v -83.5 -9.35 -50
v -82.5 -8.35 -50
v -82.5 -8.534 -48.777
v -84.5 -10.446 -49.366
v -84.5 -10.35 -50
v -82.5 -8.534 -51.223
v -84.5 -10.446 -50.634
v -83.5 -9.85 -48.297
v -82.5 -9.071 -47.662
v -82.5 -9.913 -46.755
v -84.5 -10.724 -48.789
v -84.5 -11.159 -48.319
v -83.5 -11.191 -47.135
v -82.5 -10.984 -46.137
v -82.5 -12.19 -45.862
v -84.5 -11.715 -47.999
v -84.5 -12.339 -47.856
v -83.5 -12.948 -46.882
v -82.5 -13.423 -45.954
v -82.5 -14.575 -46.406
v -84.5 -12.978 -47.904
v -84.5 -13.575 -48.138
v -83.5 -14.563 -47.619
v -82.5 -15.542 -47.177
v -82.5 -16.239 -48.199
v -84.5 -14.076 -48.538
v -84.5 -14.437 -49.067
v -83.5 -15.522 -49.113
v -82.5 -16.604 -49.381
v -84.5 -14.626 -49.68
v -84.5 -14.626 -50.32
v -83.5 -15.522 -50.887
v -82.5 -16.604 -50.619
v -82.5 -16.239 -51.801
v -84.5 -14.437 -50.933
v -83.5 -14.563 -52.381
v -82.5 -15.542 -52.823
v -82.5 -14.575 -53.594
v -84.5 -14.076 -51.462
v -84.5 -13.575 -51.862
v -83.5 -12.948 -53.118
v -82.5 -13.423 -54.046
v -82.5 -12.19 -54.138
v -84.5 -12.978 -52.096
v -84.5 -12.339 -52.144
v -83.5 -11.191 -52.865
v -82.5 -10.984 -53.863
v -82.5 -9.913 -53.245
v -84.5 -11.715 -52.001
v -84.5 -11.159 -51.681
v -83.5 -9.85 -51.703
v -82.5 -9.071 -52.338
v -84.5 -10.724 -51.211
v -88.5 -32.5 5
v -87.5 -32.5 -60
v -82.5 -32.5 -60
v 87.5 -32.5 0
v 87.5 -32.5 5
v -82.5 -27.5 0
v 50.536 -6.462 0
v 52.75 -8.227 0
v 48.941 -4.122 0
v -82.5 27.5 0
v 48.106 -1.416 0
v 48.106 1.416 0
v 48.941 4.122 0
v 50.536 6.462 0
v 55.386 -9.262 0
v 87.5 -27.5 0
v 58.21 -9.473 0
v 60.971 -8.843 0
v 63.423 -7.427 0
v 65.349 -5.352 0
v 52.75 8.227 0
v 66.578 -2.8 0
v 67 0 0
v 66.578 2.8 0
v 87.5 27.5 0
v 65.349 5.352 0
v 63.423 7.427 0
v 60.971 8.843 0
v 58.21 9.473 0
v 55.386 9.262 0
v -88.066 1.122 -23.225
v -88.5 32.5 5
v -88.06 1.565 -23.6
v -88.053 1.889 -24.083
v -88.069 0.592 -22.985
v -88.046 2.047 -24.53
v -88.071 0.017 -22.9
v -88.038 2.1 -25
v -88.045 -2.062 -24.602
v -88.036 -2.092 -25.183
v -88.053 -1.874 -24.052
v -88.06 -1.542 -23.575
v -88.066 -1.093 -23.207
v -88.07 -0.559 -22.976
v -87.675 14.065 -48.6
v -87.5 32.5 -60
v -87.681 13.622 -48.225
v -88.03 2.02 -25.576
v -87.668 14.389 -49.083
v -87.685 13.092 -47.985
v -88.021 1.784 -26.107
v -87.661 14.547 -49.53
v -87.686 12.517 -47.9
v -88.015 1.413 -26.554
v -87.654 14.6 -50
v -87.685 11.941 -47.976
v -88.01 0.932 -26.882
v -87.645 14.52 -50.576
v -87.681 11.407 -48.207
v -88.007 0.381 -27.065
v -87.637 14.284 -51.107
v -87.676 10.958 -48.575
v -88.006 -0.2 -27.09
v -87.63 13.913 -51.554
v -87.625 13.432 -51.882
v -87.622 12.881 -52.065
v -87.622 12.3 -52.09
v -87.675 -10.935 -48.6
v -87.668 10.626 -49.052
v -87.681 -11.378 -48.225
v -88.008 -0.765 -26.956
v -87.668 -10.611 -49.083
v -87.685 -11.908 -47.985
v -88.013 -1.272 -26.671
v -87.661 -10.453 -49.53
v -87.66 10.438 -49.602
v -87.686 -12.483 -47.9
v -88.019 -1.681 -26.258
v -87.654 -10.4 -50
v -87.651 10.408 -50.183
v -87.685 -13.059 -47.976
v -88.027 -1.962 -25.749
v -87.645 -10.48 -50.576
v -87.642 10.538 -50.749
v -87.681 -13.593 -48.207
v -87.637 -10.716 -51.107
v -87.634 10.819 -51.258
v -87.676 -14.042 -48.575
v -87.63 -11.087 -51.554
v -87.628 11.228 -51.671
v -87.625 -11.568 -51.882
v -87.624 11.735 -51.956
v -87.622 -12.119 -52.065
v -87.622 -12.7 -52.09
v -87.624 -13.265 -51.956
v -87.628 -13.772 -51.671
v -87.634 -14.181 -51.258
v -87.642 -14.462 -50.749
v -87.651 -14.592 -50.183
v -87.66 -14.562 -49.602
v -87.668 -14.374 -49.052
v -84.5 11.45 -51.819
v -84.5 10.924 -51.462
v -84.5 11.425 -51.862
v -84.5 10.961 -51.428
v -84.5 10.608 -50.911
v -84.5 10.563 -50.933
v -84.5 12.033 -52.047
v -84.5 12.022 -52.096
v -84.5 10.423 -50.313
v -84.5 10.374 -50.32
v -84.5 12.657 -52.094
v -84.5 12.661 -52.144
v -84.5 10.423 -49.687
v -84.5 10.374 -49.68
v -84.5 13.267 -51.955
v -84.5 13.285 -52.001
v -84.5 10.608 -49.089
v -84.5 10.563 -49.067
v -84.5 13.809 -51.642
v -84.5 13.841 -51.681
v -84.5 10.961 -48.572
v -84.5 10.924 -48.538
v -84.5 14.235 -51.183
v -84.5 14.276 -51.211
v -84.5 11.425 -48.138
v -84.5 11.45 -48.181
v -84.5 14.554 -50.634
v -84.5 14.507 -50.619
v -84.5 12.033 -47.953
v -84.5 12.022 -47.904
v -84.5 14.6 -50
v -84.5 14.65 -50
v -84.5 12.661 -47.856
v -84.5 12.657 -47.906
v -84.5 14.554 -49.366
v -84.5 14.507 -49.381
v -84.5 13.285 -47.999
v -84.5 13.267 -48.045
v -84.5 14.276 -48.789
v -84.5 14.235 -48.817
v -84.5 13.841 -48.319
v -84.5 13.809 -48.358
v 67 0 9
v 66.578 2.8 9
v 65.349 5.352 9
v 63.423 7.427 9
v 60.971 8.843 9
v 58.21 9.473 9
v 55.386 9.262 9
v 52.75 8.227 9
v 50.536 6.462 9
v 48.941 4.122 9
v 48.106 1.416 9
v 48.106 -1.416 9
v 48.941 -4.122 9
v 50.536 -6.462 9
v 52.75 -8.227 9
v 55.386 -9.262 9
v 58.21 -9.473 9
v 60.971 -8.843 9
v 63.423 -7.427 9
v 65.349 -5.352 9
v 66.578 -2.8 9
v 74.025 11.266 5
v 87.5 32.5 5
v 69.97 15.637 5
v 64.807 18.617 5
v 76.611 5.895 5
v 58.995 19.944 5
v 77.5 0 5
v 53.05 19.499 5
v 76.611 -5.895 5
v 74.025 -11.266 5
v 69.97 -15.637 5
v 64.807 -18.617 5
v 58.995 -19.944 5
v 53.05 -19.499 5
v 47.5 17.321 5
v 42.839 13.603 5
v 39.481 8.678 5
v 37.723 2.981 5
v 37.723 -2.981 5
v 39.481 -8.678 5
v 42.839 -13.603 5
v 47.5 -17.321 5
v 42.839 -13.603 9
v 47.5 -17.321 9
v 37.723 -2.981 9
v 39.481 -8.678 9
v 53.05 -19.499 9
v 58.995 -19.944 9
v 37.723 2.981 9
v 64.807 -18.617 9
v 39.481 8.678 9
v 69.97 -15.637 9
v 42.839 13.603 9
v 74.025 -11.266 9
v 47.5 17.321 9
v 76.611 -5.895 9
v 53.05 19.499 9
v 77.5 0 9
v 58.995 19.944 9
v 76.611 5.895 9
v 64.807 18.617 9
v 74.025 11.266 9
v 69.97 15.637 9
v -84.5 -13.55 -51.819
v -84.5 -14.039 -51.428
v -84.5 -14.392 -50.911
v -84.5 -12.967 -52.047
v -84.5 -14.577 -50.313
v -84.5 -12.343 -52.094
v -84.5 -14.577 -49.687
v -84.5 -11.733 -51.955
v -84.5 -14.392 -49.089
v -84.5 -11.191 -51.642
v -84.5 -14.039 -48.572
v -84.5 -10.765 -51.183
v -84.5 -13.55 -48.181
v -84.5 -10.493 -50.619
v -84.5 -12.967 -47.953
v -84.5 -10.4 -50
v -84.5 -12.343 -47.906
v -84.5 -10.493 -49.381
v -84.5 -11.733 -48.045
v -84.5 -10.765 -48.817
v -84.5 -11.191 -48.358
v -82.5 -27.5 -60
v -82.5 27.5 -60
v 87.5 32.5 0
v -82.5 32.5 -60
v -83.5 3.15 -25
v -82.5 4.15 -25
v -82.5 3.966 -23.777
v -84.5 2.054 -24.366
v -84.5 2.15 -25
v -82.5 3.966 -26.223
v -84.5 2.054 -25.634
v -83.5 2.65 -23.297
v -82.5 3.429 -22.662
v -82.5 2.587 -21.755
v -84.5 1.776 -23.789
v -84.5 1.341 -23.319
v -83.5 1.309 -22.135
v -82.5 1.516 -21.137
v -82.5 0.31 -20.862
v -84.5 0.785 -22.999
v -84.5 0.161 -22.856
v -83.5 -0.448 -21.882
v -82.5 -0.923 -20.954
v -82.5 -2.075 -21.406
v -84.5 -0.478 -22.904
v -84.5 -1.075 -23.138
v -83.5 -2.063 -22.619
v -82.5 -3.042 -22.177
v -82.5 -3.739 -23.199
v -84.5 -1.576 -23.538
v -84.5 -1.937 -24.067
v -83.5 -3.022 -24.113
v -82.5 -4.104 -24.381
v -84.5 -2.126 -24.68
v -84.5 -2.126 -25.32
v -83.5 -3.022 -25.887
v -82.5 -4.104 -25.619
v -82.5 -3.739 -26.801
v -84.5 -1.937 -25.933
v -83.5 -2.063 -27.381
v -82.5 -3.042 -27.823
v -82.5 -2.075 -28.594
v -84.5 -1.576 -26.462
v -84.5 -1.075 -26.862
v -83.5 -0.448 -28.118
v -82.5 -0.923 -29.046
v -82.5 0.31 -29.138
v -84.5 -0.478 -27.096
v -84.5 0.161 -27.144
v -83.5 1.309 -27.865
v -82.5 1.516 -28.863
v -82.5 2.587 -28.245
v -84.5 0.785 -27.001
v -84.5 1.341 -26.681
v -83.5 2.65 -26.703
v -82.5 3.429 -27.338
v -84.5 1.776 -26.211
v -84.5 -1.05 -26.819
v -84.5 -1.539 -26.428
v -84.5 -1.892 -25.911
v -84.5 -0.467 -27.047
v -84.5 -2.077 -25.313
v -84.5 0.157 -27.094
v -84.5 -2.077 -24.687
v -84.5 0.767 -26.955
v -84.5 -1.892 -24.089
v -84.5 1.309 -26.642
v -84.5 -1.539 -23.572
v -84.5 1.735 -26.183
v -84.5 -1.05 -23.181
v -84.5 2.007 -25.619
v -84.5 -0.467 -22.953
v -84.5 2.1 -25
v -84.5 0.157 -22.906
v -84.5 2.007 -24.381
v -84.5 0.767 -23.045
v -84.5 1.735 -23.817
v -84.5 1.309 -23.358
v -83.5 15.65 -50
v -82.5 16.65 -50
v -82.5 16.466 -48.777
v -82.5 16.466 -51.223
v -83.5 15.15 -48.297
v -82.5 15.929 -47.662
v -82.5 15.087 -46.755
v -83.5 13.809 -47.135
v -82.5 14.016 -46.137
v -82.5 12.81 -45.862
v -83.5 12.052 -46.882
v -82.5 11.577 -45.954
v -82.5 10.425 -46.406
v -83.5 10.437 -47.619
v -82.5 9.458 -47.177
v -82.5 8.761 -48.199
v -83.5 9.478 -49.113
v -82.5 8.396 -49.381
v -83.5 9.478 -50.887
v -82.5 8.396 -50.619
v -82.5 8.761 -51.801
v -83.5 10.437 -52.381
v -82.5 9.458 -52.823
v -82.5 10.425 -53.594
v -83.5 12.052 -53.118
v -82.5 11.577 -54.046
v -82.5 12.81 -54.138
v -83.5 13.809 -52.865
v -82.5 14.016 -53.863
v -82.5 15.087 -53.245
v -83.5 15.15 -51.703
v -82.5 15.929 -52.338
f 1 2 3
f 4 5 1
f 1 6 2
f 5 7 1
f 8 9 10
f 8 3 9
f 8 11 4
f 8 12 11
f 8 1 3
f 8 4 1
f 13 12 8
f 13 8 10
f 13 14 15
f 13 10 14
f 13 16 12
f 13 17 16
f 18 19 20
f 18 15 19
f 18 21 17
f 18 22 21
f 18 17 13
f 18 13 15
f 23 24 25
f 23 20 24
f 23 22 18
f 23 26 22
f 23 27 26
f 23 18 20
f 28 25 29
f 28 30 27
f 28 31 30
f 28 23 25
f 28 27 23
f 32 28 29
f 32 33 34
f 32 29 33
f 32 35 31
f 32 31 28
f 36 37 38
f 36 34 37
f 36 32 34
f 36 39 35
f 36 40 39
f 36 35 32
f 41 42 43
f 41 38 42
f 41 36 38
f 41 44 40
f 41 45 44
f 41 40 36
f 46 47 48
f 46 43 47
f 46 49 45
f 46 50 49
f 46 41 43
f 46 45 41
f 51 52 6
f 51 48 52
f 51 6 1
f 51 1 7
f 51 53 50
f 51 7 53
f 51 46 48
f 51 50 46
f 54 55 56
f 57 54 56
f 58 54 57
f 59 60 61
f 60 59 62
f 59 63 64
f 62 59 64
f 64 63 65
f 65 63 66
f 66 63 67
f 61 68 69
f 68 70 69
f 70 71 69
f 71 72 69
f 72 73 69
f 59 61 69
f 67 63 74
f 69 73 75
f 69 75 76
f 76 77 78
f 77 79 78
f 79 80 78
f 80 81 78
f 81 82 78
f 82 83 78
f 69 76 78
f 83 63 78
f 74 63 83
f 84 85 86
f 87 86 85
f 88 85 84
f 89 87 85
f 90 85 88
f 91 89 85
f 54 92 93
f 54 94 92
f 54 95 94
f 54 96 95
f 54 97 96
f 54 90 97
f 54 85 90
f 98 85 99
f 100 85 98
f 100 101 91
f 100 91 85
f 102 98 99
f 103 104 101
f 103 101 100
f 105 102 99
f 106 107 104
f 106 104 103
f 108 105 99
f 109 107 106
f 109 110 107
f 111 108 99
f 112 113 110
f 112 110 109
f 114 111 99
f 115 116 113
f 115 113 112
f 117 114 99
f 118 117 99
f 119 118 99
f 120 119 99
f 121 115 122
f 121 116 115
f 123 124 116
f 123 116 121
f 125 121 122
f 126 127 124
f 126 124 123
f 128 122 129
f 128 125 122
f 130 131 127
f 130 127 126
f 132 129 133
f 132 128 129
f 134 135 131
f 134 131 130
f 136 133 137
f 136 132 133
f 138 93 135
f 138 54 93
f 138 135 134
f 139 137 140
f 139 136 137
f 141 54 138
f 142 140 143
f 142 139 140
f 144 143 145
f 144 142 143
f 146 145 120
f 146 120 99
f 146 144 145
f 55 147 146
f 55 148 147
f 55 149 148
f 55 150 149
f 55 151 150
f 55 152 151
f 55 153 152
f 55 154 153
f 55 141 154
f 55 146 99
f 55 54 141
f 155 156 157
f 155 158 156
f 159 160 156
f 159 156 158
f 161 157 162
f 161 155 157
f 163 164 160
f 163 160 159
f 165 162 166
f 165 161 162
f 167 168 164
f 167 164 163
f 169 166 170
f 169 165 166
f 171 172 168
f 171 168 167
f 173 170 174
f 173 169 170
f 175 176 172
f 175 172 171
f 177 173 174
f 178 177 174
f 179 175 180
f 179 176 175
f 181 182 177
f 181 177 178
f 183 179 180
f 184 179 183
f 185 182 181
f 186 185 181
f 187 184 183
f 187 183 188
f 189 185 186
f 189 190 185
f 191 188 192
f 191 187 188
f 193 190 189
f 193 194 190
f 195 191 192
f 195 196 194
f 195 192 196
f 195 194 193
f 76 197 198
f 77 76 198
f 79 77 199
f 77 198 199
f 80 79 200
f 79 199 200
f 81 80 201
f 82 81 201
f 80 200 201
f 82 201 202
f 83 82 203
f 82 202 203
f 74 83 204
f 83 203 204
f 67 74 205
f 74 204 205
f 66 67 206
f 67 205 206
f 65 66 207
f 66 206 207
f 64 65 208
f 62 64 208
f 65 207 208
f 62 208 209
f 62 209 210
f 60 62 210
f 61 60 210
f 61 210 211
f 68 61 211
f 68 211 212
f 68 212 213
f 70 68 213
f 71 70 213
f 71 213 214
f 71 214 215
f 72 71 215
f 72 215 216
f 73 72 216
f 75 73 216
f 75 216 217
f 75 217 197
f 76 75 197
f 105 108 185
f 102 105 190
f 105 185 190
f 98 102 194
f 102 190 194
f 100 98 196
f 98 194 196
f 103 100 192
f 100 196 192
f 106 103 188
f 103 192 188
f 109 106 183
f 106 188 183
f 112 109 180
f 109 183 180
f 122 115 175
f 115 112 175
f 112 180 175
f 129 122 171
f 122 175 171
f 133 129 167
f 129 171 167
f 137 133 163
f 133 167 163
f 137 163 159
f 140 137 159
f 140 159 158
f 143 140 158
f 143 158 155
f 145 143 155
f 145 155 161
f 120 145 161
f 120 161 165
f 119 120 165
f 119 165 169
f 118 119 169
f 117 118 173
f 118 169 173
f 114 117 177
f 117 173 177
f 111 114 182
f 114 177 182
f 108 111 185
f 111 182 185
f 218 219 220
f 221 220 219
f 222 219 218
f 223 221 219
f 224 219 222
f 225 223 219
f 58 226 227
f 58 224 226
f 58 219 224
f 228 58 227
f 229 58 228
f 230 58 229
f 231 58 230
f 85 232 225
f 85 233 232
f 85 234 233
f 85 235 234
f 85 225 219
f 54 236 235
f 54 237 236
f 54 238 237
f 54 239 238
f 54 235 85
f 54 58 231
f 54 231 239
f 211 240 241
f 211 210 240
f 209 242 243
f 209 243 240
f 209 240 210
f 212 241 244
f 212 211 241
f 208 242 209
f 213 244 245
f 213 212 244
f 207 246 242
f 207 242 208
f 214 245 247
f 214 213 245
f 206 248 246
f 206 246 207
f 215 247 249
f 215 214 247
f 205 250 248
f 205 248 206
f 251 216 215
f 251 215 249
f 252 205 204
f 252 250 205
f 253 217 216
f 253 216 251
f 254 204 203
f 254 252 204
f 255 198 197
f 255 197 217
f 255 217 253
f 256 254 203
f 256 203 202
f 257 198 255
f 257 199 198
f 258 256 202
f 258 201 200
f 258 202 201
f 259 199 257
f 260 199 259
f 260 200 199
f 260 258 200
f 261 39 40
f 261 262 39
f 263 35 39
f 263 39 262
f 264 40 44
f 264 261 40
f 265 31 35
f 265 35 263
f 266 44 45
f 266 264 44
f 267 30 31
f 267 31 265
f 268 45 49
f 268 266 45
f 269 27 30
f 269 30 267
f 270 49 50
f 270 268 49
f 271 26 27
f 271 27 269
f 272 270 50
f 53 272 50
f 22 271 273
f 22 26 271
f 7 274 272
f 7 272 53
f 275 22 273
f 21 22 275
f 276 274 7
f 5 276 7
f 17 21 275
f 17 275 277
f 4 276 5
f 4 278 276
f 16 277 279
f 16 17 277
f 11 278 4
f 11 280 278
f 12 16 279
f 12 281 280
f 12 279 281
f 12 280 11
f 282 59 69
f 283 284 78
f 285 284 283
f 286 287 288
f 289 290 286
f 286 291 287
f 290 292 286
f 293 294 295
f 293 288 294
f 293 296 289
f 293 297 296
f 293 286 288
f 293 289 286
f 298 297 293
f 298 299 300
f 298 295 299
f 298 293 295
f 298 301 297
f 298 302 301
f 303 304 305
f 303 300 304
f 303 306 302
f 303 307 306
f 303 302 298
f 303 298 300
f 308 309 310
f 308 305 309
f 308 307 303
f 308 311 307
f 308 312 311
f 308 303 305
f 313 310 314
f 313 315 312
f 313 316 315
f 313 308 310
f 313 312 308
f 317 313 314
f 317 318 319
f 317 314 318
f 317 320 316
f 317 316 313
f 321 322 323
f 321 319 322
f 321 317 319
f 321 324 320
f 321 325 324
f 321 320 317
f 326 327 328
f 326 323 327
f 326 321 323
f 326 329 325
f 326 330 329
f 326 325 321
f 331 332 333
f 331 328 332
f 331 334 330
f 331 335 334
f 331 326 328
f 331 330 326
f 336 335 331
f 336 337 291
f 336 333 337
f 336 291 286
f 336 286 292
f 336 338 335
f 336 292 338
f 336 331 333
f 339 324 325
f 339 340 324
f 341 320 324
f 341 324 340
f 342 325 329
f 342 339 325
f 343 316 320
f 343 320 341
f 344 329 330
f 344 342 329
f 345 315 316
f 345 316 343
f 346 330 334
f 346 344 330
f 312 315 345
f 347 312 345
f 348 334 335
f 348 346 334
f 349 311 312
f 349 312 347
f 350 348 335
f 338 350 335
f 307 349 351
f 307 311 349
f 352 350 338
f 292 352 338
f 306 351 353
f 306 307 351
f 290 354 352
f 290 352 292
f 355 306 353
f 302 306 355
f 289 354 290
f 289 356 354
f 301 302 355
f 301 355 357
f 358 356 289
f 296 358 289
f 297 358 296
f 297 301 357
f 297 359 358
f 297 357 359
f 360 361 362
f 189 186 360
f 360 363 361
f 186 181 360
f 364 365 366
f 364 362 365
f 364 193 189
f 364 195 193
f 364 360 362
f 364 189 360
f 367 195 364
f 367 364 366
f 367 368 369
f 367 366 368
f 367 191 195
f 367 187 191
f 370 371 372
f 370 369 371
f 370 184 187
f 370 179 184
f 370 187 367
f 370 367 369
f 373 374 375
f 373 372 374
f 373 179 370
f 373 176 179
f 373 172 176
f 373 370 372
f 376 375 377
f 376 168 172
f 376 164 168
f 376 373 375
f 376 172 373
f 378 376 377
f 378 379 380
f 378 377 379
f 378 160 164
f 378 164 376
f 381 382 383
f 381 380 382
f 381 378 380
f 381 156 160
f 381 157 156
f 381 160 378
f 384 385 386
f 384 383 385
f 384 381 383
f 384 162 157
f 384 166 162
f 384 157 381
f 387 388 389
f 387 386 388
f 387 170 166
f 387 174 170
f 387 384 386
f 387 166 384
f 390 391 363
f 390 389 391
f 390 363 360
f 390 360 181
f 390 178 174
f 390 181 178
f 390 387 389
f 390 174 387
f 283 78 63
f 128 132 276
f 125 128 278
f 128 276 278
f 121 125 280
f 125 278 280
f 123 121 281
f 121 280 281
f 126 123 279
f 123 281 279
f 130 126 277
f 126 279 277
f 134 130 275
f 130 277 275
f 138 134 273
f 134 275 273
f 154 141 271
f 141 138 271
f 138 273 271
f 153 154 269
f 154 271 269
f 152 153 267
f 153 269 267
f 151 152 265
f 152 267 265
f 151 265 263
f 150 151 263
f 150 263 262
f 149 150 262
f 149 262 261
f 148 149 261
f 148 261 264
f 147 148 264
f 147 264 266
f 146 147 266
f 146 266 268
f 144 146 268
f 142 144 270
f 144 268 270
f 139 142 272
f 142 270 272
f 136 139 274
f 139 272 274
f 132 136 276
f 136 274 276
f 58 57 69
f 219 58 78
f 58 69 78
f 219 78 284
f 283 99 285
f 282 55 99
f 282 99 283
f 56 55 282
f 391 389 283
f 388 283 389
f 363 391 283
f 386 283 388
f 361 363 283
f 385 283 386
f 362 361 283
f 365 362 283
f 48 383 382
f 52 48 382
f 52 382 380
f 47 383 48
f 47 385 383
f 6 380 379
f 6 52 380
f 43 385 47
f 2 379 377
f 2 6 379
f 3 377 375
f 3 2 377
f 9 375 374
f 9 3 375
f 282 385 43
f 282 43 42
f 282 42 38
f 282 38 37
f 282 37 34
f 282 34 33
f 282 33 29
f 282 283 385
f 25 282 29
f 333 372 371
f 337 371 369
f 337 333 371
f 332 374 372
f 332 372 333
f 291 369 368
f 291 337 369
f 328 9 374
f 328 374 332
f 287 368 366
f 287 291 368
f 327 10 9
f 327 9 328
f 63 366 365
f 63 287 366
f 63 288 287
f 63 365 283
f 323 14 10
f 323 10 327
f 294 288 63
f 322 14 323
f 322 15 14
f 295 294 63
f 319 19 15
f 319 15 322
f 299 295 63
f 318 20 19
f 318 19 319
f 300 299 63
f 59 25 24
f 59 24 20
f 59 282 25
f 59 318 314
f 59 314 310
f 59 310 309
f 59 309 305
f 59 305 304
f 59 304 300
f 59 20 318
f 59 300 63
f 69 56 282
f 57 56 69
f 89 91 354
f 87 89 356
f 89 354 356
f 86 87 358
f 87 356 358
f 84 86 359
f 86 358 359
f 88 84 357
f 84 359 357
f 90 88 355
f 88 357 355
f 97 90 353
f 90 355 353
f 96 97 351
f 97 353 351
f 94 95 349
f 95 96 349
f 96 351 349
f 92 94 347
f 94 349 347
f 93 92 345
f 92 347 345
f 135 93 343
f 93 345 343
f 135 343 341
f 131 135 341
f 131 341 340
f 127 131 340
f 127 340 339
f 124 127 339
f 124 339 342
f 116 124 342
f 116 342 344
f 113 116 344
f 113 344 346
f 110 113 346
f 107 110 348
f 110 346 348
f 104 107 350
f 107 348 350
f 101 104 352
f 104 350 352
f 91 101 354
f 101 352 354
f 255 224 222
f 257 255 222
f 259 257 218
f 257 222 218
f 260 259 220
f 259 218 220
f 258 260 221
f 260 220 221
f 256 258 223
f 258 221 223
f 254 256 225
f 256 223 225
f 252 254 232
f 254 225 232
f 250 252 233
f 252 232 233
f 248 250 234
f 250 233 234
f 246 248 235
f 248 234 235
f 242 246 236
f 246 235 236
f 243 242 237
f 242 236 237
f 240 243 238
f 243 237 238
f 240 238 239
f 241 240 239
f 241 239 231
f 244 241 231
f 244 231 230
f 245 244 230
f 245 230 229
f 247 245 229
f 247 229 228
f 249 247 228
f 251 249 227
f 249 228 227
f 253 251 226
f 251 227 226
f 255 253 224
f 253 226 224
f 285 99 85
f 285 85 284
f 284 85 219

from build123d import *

# Parameters (mm, degrees)
SKETCH_W        = 175
SKETCH_H        = 65
PAD_DEPTH       = 5
SKETCH001_R     = 20
PAD001_DEPTH    = 4
SKETCH002_R     = 9.5
POCKET_DEPTH    = 9.01
PAD002_DEPTH    = 65
PAD003_DEPTH    = 5
PAD004_DEPTH    = 5
SKETCH006_R     = 4.15
POCKET001_DEPTH = 2
POCKET001_TAPER = 45
SKETCH007_R     = 2.1
POCKET002_DEPTH = 5


with BuildPart() as part:
    # Sketch → Pad (new body)
    with BuildSketch(Plane.XY):
        Rectangle(SKETCH_W, SKETCH_H)
    extrude(amount=PAD_DEPTH)

    # Sketch001 (on Face6 of Pad) → Pad001 (join)
    with BuildSketch(Plane.XY.offset(5)):
        with Locations((57.5, 0)):
            Circle(SKETCH001_R)
    extrude(amount=PAD001_DEPTH)

    # Sketch002 (on Face8 of Pad001) → Pocket (cut)
    with BuildSketch(Plane.XY.offset(9)):
        with Locations((57.5, 0)):
            Circle(SKETCH002_R)
    extrude(amount=-POCKET_DEPTH, mode=Mode.SUBTRACT)

    # Sketch003 (on Face6 of Pocket) → Pad002 (join)
    with BuildSketch(Plane.XZ.offset(32.5)):
        Polygon((-88.5, 5), (-87.5, -60), (-82.5, -60), (-82.5, 5), align=None)
    extrude(amount=-PAD002_DEPTH)

    # Sketch004 (on Face3 of Pad002) → Pad003 (join)
    with BuildSketch(Plane(origin=(0, 32.5, 0), x_dir=(-1, 0, 0), z_dir=(0, 1, 0))):
        Polygon((-87.5, 5), (-87.5, 0), (82.5, -60), (87.5, -60), (88.5, 5), align=None)
    extrude(amount=-PAD003_DEPTH)

    # Sketch005 (on Face23 of Pad003) → Pad004 (join)
    with BuildSketch(Plane.XZ.offset(32.5)):
        Polygon((-88.5, 5), (-87.5, -60), (-82.5, -60), (87.5, 0), (87.5, 5), align=None)
    extrude(amount=-PAD004_DEPTH)

    # Sketch006 (on Face21 of Pad004) → Pocket001 (cut)
    with BuildSketch(Plane.YZ.offset(-82.5)):
        with Locations((0, -25)):
            Circle(SKETCH006_R)
        with Locations((-12.5, -50)):
            Circle(SKETCH006_R)
        with Locations((12.5, -50)):
            Circle(SKETCH006_R)
    extrude(amount=-POCKET001_DEPTH, taper=POCKET001_TAPER, mode=Mode.SUBTRACT)

    # Sketch007 (on Face41 of Pocket001) → Pocket002 (cut)
    with BuildSketch(Plane.YZ.offset(-84.5)):
        with Locations((0, -25)):
            Circle(SKETCH007_R)
        with Locations((12.5, -50)):
            Circle(SKETCH007_R)
        with Locations((-12.5, -50)):
            Circle(SKETCH007_R)
    extrude(amount=-POCKET002_DEPTH, mode=Mode.SUBTRACT)


solid = part.part
